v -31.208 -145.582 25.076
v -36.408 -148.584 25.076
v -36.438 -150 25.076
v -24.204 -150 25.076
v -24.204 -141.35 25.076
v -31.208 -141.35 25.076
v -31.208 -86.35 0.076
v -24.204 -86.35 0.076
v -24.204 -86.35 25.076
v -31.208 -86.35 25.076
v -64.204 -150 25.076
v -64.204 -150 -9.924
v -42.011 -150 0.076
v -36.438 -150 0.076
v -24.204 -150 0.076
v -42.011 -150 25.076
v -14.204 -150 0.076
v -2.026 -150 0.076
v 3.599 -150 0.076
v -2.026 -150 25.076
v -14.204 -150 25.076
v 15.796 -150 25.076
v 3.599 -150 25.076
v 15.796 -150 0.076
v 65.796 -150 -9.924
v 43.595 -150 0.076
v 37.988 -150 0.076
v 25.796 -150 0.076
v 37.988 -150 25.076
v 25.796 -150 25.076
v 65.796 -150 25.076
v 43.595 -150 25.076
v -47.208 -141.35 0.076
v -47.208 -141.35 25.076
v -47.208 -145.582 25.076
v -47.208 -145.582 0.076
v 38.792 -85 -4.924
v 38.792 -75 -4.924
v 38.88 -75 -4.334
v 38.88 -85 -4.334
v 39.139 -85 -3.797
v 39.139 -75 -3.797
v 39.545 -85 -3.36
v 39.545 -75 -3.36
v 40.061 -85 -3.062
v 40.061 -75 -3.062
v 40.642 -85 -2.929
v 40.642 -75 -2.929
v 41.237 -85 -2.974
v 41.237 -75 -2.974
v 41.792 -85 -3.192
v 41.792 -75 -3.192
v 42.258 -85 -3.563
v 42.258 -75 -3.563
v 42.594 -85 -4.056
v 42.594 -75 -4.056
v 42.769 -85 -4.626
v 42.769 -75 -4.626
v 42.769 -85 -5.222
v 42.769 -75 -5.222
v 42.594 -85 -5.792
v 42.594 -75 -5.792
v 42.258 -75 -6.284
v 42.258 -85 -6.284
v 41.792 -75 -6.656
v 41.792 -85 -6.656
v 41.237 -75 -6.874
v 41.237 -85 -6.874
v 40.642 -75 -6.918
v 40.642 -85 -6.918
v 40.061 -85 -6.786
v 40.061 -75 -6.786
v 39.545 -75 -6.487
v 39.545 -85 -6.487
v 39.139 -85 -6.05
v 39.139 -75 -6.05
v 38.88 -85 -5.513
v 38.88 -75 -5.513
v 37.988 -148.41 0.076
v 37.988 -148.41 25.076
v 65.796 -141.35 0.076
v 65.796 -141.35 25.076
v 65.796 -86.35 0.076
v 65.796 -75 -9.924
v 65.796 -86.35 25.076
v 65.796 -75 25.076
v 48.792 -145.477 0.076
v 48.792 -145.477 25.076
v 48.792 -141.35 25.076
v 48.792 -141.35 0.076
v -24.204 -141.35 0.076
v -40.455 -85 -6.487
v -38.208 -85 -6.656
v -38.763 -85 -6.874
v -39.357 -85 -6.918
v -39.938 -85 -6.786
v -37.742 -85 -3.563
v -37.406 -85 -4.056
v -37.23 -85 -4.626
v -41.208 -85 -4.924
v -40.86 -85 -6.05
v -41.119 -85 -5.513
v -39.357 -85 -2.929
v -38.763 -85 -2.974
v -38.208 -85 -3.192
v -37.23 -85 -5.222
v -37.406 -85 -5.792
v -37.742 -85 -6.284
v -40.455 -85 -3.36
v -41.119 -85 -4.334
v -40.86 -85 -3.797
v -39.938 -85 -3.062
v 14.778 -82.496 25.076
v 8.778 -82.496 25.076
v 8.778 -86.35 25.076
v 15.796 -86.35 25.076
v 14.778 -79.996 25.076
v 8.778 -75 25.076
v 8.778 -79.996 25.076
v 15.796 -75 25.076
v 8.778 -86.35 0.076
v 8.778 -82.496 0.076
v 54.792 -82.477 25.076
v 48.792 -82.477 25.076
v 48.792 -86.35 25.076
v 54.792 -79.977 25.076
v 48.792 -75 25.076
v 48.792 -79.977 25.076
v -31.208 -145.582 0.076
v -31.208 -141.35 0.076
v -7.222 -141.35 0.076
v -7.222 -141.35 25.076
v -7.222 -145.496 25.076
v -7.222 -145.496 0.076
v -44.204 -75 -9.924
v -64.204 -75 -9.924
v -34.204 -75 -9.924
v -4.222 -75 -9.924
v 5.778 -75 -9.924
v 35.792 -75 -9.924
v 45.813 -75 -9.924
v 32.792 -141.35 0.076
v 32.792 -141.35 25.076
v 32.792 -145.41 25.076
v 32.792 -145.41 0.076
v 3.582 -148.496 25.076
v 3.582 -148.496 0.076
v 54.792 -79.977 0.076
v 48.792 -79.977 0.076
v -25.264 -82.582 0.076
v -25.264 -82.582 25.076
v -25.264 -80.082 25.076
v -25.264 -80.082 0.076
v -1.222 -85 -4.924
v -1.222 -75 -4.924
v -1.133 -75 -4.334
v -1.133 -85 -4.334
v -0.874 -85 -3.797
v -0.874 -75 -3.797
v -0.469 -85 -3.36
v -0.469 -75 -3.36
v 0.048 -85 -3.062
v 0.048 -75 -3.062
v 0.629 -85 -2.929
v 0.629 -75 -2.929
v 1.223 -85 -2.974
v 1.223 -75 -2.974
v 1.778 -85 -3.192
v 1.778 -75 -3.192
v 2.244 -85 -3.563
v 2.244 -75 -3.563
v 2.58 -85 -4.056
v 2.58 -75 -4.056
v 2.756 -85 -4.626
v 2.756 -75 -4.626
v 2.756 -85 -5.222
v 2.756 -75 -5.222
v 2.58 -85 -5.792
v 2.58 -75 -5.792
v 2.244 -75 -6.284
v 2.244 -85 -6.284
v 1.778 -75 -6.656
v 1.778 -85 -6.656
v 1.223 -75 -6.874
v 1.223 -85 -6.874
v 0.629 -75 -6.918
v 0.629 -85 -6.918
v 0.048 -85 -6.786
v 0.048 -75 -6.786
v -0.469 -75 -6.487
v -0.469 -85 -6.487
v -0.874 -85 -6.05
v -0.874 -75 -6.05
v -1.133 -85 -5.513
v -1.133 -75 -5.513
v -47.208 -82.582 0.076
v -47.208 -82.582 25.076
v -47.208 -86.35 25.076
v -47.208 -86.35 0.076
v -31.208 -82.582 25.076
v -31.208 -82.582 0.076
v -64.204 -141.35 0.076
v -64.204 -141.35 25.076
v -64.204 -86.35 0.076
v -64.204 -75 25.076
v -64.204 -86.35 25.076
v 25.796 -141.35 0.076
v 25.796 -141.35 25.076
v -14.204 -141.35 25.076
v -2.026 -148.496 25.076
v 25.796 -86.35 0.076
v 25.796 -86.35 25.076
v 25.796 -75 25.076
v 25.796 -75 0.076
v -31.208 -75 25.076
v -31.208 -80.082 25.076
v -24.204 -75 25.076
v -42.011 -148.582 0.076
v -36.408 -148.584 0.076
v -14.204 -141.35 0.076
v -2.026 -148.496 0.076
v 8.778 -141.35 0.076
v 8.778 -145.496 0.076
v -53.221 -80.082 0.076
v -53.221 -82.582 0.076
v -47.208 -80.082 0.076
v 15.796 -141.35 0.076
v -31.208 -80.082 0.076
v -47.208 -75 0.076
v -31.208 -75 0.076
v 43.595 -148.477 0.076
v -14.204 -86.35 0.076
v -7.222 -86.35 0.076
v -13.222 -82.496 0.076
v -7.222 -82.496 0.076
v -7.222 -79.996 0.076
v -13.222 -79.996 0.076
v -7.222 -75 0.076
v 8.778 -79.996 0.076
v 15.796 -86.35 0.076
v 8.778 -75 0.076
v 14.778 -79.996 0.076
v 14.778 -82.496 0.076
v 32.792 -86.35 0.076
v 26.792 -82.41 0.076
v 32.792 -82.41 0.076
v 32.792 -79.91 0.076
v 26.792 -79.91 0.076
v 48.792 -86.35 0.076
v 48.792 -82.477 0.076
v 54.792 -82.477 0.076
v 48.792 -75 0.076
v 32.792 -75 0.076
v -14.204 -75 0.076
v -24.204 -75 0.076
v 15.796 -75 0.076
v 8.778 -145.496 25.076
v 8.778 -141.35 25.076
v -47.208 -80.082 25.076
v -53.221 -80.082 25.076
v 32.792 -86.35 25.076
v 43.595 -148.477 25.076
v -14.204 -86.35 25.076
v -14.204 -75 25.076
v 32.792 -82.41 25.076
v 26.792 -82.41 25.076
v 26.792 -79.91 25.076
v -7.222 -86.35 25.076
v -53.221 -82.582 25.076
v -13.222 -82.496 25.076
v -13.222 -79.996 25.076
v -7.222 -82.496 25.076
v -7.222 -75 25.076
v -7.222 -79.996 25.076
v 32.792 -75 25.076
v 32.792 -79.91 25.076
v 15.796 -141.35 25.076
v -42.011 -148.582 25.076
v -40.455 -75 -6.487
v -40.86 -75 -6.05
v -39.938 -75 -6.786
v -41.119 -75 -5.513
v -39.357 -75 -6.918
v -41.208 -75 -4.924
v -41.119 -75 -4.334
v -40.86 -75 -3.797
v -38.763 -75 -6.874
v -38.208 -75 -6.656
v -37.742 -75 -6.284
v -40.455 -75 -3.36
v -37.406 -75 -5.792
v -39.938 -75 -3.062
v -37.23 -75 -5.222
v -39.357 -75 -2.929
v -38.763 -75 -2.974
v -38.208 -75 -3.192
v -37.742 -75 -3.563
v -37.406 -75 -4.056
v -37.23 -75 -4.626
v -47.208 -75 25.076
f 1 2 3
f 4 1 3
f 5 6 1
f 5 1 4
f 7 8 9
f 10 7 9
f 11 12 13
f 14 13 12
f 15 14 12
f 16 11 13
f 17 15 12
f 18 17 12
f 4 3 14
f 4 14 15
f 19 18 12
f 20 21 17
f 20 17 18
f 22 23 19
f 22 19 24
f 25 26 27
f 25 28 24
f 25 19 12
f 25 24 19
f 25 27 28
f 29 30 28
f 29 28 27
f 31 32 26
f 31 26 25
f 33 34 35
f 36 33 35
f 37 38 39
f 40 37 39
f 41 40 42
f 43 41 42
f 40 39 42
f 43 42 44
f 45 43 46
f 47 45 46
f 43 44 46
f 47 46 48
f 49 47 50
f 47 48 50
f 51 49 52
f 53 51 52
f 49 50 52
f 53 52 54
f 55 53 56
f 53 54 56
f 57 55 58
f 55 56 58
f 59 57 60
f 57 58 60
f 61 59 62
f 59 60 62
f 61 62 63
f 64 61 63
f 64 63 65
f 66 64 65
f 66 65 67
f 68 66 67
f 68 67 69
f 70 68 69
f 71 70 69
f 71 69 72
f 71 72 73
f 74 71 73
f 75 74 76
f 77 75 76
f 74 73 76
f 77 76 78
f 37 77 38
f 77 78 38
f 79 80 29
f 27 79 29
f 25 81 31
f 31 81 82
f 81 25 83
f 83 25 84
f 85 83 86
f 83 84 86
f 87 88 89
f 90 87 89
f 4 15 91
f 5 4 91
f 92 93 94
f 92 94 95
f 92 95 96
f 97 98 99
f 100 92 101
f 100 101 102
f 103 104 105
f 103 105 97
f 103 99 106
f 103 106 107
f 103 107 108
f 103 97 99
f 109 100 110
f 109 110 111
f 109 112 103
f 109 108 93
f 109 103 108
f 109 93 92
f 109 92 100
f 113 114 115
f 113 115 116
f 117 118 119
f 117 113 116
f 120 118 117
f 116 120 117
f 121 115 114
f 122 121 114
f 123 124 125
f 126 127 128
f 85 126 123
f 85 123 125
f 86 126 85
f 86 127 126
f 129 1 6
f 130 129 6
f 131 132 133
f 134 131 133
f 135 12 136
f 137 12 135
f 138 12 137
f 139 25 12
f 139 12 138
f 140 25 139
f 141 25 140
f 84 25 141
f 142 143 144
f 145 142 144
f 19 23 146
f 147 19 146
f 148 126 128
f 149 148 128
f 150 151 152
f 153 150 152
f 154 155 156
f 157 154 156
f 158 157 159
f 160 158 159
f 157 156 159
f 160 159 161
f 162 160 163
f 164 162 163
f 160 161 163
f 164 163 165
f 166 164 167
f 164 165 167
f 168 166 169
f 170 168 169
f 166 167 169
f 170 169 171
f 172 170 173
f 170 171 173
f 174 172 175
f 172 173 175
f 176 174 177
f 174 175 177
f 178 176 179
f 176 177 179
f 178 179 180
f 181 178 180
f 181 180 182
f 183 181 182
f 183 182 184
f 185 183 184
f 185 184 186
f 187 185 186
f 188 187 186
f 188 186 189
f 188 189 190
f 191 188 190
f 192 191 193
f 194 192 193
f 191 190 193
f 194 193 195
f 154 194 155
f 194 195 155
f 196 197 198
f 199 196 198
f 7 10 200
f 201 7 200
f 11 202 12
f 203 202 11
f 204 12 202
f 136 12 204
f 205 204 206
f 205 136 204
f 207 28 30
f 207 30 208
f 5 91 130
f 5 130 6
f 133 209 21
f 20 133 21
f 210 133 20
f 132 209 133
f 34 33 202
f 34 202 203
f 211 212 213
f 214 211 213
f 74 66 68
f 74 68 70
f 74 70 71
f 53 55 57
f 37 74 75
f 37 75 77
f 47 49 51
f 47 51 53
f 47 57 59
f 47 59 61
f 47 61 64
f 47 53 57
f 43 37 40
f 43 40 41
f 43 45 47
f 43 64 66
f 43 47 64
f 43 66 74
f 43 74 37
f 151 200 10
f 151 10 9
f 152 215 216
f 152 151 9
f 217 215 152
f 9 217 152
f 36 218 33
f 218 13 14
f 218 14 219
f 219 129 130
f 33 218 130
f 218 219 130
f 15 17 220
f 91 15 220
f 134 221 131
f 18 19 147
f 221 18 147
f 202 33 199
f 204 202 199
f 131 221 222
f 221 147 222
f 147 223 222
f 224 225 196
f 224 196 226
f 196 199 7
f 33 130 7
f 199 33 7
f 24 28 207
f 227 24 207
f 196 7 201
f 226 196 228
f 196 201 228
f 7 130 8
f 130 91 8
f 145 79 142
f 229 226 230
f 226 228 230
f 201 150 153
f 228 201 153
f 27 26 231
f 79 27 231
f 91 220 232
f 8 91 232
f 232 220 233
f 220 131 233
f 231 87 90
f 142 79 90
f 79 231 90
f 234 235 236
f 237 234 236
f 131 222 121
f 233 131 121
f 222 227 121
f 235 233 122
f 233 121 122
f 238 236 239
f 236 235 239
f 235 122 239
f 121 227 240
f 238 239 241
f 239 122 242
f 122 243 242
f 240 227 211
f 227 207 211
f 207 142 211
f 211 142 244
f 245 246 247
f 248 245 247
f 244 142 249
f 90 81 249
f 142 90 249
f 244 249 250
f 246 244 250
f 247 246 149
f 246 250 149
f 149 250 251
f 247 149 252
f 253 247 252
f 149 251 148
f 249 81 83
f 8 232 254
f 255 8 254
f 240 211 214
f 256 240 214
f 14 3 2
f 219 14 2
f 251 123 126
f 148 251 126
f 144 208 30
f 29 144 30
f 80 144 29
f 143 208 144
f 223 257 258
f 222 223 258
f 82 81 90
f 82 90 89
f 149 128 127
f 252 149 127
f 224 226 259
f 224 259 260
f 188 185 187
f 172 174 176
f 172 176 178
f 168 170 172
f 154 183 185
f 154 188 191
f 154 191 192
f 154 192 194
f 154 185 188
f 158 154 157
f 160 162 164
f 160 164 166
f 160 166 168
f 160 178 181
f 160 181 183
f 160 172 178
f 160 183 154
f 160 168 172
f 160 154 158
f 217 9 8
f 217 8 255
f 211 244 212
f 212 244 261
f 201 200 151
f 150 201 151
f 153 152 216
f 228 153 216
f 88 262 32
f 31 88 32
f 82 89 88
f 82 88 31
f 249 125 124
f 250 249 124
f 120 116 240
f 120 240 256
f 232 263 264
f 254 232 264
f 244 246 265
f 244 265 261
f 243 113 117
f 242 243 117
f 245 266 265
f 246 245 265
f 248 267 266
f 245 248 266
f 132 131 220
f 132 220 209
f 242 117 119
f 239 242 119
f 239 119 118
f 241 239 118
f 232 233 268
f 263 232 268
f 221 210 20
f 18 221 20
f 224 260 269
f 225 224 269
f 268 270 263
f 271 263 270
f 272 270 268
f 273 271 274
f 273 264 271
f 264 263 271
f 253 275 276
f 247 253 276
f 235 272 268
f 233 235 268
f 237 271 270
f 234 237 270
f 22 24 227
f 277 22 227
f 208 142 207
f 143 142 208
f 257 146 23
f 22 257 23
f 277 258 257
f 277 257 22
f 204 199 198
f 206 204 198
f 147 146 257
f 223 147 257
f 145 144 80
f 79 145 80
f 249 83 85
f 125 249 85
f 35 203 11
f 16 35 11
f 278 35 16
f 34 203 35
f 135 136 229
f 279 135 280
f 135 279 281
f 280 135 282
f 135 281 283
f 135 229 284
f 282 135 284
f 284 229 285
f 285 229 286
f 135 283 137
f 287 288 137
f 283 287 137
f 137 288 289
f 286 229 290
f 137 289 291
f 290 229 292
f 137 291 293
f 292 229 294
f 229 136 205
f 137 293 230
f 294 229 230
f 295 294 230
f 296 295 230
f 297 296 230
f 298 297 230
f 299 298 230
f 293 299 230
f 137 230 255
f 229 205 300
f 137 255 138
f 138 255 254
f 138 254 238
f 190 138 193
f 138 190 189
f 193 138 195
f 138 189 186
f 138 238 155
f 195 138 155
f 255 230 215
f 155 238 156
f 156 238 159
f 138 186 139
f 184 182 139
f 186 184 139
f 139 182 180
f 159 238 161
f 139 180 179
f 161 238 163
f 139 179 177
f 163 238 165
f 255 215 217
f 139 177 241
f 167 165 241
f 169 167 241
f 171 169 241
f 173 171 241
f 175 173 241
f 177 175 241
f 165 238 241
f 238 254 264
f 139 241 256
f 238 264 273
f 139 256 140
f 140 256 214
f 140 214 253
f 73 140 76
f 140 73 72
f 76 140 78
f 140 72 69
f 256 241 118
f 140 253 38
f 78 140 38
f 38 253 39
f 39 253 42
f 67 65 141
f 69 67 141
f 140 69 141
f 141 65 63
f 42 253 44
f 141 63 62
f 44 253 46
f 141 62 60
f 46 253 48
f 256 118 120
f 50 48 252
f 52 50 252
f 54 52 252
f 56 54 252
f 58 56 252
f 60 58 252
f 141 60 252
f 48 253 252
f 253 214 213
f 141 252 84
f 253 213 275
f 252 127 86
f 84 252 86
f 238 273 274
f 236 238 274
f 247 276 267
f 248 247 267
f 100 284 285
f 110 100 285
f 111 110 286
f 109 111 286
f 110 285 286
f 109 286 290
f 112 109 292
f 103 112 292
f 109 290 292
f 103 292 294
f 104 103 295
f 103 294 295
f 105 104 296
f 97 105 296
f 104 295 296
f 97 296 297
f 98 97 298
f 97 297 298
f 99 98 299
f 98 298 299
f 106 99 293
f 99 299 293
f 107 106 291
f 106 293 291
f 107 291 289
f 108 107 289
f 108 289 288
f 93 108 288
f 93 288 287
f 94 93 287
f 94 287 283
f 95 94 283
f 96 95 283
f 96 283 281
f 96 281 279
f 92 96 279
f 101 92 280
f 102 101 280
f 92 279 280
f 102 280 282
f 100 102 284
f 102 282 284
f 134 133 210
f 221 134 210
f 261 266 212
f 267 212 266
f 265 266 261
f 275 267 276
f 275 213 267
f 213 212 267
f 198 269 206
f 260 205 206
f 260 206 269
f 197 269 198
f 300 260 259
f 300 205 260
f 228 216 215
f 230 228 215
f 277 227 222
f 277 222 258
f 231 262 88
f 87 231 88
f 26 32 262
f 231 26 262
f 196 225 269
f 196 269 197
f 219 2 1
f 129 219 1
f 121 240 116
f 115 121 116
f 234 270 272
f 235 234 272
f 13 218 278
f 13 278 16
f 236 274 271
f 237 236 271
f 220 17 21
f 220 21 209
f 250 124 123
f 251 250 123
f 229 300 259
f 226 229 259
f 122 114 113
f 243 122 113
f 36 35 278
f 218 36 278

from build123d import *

# Parameters (mm, degrees)
F0_W      = 130
F0_H      = 50
F1_DEPTH  = 150
F2_W      = 75
F2_H      = 25.0761986731
F3_DEPTH  = 130.001
F6_DEPTH  = 25
F8_DEPTH  = 25
F10_DEPTH = 25
F11_W     = 150
F11_H     = 15
F12_DEPTH = 161
F13_W     = 20
F13_H     = 75
F13_W_2   = 29.982657928
F13_W_3   = 30.0133985095
F13_W_4   = 19.9825553596
F14_DEPTH = 25
F15_W     = 75
F15_H     = 9.9238013269
F16_DEPTH = 100
F17_R     = 2
F18_DEPTH = 10
F19_W     = 55
F19_H     = 25
F20_DEPTH = 140
F4_W      = 10
F4_H      = 75
F21_DEPTH = 25


with BuildPart() as f1:
    # F0 (on Front) → F1 (new body)
    with BuildSketch(Plane.XZ):
        with Locations((0.7955543697, 0.0761986731)):
            Rectangle(F0_W, F0_H)
    extrude(amount=F1_DEPTH)

    # F2 (on face) → F3 (cut, through all)
    with BuildSketch(Plane.YZ.offset(65.7955543697)):
        with Locations((-37.5, 12.5380993366)):
            Rectangle(F2_W, F2_H)
    extrude(amount=-F3_DEPTH, mode=Mode.SUBTRACT)

    # F5 (on face) → F6 (cut)
    with BuildSketch(Plane.XY.offset(25.0761986731)):
        Polygon((-31.2077699304, -75), (-47.2077699304, -75), (-47.2077699304, -80.0817286968), (-53.221039474, -80.0817286968), (-53.221039474, -82.5817286968), (-47.2077699304, -82.5817286968), (-47.2077699304, -145.5817286968), (-42.0114186667, -148.5818434977), (-42.0114186667, -150), (-36.4380876982, -150), (-36.4078128177, -148.5839748576), (-31.2077699304, -145.5817286968), (-31.2077699304, -82.5817286968), (-25.2643544227, -82.5817286968), (-25.2643544227, -80.0817286968), (-31.2077699304, -80.0817286968), align=None)
    extrude(amount=-F6_DEPTH, mode=Mode.SUBTRACT)

    # F7 (on face) → F8 (cut)
    with BuildSketch(Plane.XY.offset(25.0761986731)):
        Polygon((48.7916108072, -73.9334896207), (32.7916108072, -73.8659650087), (32.7916108072, -79.9098435044), (26.7916108072, -79.9098435044), (26.7916108072, -82.4098435044), (32.7916108072, -82.4098435044), (32.7916108072, -145.4098435044), (37.9877632299, -148.4098435044), (37.9877632299, -152.647121688), (43.5954583845, -152.647121688), (43.5954583845, -148.4773681164), (48.7916108072, -145.4773681164), (48.7916108072, -82.4773681164), (54.7916108072, -82.4773681164), (54.7916108072, -79.9773681164), (48.7916108072, -79.9773681164), align=None)
    extrude(amount=-F8_DEPTH, mode=Mode.SUBTRACT)

    # F9 (on face) → F10 (cut)
    with BuildSketch(Plane.XY.offset(25.0761986731)):
        Polygon((8.7782122977, -73.7298429012), (-7.2217877023, -73.7298429012), (-7.2217877023, -79.9959796667), (-13.2217877023, -79.9959796667), (-13.2217877023, -82.4959796667), (-7.2217877023, -82.4959796667), (-7.2217877023, -145.4959796667), (-2.0256352796, -148.4959796667), (-2.0256352796, -153.1414538622), (3.6333000753, -153.1414538622), (3.582059875, -148.4959796667), (8.7782122977, -145.4959796667), (8.7782122977, -82.4959796667), (14.7782122977, -82.4959796667), (14.7782122977, -79.9959796667), (8.7782122977, -79.9959796667), align=None)
    extrude(amount=-F10_DEPTH, mode=Mode.SUBTRACT)

    # F11 (on face) → F12 (cut)
    with BuildSketch(Plane.YZ.offset(65.7955543697)):
        with Locations((-75, -17.4238013269)):
            Rectangle(F11_W, F11_H)
    extrude(amount=-F12_DEPTH, mode=Mode.SUBTRACT)

    # F13 (on face) → F14 (cut)
    with BuildSketch(Plane.XY):
        with Locations((-54.2044456303, -37.5)):
            Rectangle(F13_W, F13_H)
        with Locations((-19.2131166663, -37.5)):
            Rectangle(F13_W_2, F13_H)
        with Locations((20.7849115524, -37.5)):
            Rectangle(F13_W_3, F13_H)
        with Locations((55.8042766899, -37.5)):
            Rectangle(F13_W_4, F13_H)
    extrude(amount=-F14_DEPTH, mode=Mode.SUBTRACT)

    # F15 (on face) → F16 (cut)
    with BuildSketch(Plane.YZ.offset(45.8129990101)):
        with Locations((-37.5, -4.9619006634)):
            Rectangle(F15_W, F15_H)
    extrude(amount=-F16_DEPTH, mode=Mode.SUBTRACT)

    # F17 (on face) → F18 (cut)
    with BuildSketch(Plane(origin=(0, -75, 0), x_dir=(-1, 0, 0), z_dir=(0, 1, 0))):
        with Locations((-40.7916108072, -4.9238013269)):
            Circle(F17_R)
        with Locations((-0.7782122977, -4.9238013269)):
            Circle(F17_R)
        with Locations((39.2077699304, -4.9238013269)):
            Circle(F17_R)
    extrude(amount=-F18_DEPTH, mode=Mode.SUBTRACT)

    # F19 (on face) → F20 (cut)
    with BuildSketch(Plane.YZ.offset(65.7955543697)):
        with Locations((-113.85, 12.5761986731)):
            Rectangle(F19_W, F19_H)
    extrude(amount=-F20_DEPTH, mode=Mode.SUBTRACT)

    # F4 (on face) → F21 (cut)
    with BuildSketch(Plane.XY.offset(25.0761986731)):
        with Locations((-19.2044456303, -112.5)):
            Rectangle(F4_W, F4_H)
        with Locations((20.7955543697, -112.5)):
            Rectangle(F4_W, F4_H)
    extrude(amount=-F21_DEPTH, mode=Mode.SUBTRACT)


solid = f1.part
